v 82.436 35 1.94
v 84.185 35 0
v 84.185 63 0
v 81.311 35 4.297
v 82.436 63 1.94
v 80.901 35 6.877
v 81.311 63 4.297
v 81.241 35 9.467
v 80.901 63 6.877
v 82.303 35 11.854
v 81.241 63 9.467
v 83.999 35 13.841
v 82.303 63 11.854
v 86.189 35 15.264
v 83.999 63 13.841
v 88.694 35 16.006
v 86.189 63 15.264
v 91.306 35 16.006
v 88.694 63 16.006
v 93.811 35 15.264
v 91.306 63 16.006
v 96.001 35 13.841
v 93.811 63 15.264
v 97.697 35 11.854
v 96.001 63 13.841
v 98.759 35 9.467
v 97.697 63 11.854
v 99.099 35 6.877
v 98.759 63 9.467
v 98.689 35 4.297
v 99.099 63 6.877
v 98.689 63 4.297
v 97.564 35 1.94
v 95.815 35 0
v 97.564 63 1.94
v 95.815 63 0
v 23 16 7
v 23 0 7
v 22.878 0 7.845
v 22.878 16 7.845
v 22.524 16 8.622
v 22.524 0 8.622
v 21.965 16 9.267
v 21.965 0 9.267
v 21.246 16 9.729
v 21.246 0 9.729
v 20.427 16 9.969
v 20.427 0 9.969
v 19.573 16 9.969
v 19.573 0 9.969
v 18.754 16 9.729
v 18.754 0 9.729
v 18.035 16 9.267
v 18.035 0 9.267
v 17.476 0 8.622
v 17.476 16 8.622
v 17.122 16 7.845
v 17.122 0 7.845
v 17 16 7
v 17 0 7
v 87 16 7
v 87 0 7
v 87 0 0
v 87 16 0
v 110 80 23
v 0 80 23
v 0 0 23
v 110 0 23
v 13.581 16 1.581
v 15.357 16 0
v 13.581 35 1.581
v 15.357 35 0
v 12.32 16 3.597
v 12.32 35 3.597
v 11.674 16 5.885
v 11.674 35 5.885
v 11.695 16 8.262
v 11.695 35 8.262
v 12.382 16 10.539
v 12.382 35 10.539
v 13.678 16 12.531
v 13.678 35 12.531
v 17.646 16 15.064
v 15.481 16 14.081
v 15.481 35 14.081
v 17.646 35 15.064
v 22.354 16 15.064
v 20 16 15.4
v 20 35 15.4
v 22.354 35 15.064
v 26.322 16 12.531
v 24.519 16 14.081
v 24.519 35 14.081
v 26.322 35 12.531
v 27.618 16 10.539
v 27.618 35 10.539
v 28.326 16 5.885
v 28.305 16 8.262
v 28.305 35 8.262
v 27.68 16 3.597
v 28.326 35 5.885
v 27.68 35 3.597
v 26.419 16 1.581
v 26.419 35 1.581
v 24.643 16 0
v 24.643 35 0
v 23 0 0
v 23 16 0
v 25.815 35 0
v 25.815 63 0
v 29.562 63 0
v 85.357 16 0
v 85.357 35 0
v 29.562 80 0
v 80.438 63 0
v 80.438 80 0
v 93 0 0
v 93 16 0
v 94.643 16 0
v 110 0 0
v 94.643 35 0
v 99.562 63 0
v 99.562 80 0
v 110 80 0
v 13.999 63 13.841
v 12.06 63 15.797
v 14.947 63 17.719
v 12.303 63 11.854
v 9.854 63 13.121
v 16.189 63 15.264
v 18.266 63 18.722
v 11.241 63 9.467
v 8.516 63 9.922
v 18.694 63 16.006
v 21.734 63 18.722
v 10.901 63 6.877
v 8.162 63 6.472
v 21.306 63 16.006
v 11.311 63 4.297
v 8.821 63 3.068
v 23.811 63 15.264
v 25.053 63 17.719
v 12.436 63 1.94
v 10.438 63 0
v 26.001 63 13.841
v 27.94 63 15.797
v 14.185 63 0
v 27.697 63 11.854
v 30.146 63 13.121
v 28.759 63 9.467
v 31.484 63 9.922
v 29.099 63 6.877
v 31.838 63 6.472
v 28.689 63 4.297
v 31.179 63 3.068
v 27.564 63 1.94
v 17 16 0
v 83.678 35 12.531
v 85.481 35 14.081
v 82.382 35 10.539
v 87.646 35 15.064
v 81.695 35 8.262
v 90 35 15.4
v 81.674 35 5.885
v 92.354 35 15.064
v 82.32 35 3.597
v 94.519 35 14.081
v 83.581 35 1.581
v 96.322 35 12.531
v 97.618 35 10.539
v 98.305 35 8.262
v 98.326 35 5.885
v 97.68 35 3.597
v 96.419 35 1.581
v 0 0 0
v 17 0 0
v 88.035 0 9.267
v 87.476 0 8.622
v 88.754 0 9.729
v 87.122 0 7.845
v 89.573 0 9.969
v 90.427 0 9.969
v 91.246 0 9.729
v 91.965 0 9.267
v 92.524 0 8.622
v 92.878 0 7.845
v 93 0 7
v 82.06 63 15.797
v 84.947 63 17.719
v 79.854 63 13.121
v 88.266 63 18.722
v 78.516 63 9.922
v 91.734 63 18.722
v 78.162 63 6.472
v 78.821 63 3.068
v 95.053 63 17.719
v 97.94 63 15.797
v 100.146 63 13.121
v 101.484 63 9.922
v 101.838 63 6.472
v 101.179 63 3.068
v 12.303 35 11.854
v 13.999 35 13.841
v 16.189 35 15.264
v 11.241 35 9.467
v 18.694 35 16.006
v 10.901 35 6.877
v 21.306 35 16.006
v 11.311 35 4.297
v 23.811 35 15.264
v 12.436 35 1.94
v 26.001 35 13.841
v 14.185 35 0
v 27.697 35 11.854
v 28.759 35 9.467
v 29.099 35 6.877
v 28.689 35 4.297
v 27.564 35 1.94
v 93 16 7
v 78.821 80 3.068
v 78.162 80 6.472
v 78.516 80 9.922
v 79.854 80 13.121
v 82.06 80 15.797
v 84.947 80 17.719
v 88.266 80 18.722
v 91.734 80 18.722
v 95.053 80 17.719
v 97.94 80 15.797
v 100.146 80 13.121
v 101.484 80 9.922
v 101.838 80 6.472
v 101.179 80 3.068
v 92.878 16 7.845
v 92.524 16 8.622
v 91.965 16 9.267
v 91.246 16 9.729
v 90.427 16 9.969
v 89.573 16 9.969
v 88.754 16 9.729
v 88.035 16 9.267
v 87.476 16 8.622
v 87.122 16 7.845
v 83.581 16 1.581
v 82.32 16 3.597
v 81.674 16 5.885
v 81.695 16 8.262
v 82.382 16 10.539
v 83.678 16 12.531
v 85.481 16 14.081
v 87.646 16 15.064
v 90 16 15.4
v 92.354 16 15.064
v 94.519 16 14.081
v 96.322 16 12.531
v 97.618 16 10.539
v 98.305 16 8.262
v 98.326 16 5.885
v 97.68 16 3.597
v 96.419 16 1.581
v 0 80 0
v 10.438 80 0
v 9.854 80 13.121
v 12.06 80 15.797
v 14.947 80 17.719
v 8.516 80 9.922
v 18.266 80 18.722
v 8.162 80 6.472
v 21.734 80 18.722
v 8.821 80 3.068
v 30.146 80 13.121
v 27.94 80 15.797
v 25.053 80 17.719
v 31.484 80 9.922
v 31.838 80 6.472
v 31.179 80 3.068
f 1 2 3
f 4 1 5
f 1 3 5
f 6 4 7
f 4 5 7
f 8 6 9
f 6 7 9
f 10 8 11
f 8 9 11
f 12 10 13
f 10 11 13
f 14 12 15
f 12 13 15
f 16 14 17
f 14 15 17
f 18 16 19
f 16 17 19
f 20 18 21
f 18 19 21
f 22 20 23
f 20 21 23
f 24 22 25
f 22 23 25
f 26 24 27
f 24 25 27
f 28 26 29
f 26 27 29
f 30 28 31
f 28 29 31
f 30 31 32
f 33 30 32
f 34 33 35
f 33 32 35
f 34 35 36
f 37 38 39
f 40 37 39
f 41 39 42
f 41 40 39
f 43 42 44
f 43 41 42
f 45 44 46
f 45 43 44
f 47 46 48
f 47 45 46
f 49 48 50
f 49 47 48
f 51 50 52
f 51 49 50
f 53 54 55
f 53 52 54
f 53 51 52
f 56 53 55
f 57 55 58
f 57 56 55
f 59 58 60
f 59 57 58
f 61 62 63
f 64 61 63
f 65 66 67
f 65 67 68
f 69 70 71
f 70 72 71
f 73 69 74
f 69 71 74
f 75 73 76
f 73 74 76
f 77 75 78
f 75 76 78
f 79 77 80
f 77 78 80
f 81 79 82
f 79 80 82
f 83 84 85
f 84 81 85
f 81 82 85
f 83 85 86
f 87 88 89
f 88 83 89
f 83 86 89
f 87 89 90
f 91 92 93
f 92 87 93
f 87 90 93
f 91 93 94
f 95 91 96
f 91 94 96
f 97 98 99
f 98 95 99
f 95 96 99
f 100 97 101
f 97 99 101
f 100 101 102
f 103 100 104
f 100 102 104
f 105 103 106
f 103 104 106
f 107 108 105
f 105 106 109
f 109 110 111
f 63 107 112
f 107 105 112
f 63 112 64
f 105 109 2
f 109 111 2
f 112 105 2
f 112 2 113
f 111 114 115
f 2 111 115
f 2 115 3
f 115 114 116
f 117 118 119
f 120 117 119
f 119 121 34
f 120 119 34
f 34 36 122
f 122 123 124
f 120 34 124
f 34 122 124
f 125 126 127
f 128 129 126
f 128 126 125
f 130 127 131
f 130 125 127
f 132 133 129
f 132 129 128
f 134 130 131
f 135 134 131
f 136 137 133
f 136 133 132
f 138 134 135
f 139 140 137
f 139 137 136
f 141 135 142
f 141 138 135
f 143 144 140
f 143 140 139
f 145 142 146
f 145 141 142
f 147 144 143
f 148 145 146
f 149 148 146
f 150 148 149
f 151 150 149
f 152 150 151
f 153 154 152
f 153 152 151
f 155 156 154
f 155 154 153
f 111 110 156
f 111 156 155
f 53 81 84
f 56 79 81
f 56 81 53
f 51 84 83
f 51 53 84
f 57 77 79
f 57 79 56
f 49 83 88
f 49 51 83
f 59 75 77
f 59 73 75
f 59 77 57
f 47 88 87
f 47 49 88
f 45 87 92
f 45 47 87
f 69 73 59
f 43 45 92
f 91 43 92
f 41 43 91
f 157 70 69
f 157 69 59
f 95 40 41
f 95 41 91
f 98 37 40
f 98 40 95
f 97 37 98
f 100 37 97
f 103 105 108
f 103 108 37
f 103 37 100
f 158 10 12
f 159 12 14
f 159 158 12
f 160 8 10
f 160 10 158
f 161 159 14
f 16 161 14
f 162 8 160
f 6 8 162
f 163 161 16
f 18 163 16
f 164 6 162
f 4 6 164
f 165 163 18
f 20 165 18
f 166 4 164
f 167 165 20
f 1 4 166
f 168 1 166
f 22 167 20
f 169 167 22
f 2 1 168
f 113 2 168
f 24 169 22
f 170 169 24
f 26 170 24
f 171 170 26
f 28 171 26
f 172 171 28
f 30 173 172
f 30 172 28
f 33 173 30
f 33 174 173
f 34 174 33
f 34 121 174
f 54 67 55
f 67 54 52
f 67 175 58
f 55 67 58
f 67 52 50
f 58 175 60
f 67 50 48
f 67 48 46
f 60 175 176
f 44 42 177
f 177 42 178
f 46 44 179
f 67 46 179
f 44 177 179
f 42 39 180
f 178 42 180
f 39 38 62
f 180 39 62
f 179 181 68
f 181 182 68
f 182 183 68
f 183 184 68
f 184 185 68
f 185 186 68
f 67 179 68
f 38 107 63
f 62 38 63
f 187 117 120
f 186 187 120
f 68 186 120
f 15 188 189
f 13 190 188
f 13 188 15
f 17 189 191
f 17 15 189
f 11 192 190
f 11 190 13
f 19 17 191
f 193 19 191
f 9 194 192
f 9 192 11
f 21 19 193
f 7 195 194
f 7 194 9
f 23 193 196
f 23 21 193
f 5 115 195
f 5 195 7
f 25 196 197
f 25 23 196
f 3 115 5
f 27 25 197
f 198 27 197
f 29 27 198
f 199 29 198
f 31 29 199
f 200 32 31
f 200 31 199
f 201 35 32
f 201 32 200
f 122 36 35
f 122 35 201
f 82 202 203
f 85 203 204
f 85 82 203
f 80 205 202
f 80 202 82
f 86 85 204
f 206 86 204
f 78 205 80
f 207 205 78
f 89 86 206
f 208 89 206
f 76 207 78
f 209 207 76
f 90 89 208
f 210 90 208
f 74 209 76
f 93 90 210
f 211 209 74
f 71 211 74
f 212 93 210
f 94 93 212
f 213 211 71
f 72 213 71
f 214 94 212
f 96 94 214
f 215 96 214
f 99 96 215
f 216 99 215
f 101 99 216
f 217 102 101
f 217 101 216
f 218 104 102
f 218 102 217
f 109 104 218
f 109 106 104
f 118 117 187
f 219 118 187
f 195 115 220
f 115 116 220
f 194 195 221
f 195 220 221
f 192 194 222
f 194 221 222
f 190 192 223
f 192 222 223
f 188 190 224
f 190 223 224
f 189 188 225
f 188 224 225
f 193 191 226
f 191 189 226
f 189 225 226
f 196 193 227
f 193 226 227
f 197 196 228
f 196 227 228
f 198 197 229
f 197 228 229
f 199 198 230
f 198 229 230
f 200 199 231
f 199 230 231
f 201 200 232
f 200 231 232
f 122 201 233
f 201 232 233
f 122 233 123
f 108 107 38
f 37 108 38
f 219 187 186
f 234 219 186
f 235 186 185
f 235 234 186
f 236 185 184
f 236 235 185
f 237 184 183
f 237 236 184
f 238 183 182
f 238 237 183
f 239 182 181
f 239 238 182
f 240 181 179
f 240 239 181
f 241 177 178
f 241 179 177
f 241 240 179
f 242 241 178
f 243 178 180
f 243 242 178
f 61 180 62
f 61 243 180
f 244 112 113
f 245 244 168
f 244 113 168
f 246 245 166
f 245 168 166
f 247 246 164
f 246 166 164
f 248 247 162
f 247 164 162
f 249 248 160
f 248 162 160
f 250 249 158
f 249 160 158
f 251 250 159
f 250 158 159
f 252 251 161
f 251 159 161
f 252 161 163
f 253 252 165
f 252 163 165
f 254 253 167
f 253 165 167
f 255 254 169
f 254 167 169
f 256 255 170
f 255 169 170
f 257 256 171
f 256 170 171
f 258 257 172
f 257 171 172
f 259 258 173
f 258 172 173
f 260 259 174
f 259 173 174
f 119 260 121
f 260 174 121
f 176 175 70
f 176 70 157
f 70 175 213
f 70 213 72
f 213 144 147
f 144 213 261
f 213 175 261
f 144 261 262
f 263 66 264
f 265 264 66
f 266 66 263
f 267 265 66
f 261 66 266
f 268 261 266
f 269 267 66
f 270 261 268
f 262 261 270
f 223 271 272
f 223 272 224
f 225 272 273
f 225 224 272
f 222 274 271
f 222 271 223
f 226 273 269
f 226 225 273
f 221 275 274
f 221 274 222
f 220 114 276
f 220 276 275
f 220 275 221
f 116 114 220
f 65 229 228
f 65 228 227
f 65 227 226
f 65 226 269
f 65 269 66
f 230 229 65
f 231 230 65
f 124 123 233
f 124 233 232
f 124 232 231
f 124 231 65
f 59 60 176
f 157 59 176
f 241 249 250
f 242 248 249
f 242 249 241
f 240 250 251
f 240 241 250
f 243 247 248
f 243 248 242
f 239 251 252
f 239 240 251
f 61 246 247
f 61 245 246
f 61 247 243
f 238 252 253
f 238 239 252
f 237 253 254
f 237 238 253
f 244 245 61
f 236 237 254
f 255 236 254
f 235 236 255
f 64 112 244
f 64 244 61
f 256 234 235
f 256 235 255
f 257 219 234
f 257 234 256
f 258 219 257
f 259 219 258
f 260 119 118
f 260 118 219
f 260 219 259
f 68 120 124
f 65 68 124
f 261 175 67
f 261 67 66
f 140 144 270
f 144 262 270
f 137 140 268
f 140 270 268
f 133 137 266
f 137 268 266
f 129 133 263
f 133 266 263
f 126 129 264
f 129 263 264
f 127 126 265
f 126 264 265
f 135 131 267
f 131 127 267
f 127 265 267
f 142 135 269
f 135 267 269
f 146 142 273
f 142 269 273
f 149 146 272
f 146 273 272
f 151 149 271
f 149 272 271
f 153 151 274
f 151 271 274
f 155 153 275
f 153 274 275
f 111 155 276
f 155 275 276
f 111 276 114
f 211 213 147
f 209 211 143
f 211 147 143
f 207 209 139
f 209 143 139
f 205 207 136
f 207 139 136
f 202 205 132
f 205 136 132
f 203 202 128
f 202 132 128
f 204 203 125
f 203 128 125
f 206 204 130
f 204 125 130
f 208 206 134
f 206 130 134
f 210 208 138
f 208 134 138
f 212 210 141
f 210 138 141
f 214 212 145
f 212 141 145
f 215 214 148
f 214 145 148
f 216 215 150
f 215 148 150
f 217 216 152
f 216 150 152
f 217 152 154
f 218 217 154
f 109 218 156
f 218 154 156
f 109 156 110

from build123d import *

# Parameters (mm, degrees)
SKETCH2_W                    = 110
SKETCH2_H                    = 80
BOSS_EXTRUDE1_DEPTH          = 23
SKETCH3_R                    = 9.1
THREAD_EXTRUDE_DEPTH         = 45
SKETCH5_R                    = 11.85
NUT_EXTRUDE_DEPTH            = 17
SKETCH6_R                    = 8.4
MINOR_DIANETER_EXTRUDE_DEPTH = 64
CABLE_EXTRUDE_DEPTH          = 138.945641468


with BuildPart() as part:
    # Sketch2 → Boss-Extrude1 (new body)
    with BuildSketch(Plane.XY):
        with Locations((55, 40)):
            Rectangle(SKETCH2_W, SKETCH2_H)
    extrude(amount=BOSS_EXTRUDE1_DEPTH)

    # Sketch3 → Thread extrude (cut)
    with BuildSketch(Plane(origin=(0, 80, 0), x_dir=(1, 0, 0), z_dir=(0, 1, 0))):
        with Locations((20, -7)):
            Circle(SKETCH3_R)
        with Locations((90, -7)):
            Circle(SKETCH3_R)
    extrude(amount=-THREAD_EXTRUDE_DEPTH, mode=Mode.SUBTRACT)

    # Sketch5 → Nut extrude (cut)
    with BuildSketch(Plane(origin=(0, 80, 0), x_dir=(1, 0, 0), z_dir=(0, 1, 0))):
        with Locations((20, -7)):
            Circle(SKETCH5_R)
        with Locations((90, -7)):
            Circle(SKETCH5_R)
    extrude(amount=-NUT_EXTRUDE_DEPTH, mode=Mode.SUBTRACT)

    # Sketch6 → minor dianeter extrude (cut)
    with BuildSketch(Plane(origin=(0, 80, 0), x_dir=(1, 0, 0), z_dir=(0, 1, 0))):
        with Locations((20, -7)):
            Circle(SKETCH6_R)
        with Locations((90, -7)):
            Circle(SKETCH6_R)
    extrude(amount=-MINOR_DIANETER_EXTRUDE_DEPTH, mode=Mode.SUBTRACT)

    # Sketch4 → Cable extrude (cut, through all)
    with BuildSketch(Plane(origin=(0, 80, 0), x_dir=(1, 0, 0), z_dir=(0, 1, 0))):
        with BuildLine():
            Line((17, -7), (17, 0))
            Line((17, 0), (23, 0))
            Line((23, 0), (23, -7))
            ThreePointArc((23, -7), (20, -10), (17, -7))
        make_face()
        with BuildLine():
            Line((87, -7), (87, 0))
            Line((87, 0), (93, 0))
            Line((93, 0), (93, -7))
            ThreePointArc((93, -7), (90, -10), (87, -7))
        make_face()
    extrude(amount=-CABLE_EXTRUDE_DEPTH, mode=Mode.SUBTRACT)


solid = part.part
